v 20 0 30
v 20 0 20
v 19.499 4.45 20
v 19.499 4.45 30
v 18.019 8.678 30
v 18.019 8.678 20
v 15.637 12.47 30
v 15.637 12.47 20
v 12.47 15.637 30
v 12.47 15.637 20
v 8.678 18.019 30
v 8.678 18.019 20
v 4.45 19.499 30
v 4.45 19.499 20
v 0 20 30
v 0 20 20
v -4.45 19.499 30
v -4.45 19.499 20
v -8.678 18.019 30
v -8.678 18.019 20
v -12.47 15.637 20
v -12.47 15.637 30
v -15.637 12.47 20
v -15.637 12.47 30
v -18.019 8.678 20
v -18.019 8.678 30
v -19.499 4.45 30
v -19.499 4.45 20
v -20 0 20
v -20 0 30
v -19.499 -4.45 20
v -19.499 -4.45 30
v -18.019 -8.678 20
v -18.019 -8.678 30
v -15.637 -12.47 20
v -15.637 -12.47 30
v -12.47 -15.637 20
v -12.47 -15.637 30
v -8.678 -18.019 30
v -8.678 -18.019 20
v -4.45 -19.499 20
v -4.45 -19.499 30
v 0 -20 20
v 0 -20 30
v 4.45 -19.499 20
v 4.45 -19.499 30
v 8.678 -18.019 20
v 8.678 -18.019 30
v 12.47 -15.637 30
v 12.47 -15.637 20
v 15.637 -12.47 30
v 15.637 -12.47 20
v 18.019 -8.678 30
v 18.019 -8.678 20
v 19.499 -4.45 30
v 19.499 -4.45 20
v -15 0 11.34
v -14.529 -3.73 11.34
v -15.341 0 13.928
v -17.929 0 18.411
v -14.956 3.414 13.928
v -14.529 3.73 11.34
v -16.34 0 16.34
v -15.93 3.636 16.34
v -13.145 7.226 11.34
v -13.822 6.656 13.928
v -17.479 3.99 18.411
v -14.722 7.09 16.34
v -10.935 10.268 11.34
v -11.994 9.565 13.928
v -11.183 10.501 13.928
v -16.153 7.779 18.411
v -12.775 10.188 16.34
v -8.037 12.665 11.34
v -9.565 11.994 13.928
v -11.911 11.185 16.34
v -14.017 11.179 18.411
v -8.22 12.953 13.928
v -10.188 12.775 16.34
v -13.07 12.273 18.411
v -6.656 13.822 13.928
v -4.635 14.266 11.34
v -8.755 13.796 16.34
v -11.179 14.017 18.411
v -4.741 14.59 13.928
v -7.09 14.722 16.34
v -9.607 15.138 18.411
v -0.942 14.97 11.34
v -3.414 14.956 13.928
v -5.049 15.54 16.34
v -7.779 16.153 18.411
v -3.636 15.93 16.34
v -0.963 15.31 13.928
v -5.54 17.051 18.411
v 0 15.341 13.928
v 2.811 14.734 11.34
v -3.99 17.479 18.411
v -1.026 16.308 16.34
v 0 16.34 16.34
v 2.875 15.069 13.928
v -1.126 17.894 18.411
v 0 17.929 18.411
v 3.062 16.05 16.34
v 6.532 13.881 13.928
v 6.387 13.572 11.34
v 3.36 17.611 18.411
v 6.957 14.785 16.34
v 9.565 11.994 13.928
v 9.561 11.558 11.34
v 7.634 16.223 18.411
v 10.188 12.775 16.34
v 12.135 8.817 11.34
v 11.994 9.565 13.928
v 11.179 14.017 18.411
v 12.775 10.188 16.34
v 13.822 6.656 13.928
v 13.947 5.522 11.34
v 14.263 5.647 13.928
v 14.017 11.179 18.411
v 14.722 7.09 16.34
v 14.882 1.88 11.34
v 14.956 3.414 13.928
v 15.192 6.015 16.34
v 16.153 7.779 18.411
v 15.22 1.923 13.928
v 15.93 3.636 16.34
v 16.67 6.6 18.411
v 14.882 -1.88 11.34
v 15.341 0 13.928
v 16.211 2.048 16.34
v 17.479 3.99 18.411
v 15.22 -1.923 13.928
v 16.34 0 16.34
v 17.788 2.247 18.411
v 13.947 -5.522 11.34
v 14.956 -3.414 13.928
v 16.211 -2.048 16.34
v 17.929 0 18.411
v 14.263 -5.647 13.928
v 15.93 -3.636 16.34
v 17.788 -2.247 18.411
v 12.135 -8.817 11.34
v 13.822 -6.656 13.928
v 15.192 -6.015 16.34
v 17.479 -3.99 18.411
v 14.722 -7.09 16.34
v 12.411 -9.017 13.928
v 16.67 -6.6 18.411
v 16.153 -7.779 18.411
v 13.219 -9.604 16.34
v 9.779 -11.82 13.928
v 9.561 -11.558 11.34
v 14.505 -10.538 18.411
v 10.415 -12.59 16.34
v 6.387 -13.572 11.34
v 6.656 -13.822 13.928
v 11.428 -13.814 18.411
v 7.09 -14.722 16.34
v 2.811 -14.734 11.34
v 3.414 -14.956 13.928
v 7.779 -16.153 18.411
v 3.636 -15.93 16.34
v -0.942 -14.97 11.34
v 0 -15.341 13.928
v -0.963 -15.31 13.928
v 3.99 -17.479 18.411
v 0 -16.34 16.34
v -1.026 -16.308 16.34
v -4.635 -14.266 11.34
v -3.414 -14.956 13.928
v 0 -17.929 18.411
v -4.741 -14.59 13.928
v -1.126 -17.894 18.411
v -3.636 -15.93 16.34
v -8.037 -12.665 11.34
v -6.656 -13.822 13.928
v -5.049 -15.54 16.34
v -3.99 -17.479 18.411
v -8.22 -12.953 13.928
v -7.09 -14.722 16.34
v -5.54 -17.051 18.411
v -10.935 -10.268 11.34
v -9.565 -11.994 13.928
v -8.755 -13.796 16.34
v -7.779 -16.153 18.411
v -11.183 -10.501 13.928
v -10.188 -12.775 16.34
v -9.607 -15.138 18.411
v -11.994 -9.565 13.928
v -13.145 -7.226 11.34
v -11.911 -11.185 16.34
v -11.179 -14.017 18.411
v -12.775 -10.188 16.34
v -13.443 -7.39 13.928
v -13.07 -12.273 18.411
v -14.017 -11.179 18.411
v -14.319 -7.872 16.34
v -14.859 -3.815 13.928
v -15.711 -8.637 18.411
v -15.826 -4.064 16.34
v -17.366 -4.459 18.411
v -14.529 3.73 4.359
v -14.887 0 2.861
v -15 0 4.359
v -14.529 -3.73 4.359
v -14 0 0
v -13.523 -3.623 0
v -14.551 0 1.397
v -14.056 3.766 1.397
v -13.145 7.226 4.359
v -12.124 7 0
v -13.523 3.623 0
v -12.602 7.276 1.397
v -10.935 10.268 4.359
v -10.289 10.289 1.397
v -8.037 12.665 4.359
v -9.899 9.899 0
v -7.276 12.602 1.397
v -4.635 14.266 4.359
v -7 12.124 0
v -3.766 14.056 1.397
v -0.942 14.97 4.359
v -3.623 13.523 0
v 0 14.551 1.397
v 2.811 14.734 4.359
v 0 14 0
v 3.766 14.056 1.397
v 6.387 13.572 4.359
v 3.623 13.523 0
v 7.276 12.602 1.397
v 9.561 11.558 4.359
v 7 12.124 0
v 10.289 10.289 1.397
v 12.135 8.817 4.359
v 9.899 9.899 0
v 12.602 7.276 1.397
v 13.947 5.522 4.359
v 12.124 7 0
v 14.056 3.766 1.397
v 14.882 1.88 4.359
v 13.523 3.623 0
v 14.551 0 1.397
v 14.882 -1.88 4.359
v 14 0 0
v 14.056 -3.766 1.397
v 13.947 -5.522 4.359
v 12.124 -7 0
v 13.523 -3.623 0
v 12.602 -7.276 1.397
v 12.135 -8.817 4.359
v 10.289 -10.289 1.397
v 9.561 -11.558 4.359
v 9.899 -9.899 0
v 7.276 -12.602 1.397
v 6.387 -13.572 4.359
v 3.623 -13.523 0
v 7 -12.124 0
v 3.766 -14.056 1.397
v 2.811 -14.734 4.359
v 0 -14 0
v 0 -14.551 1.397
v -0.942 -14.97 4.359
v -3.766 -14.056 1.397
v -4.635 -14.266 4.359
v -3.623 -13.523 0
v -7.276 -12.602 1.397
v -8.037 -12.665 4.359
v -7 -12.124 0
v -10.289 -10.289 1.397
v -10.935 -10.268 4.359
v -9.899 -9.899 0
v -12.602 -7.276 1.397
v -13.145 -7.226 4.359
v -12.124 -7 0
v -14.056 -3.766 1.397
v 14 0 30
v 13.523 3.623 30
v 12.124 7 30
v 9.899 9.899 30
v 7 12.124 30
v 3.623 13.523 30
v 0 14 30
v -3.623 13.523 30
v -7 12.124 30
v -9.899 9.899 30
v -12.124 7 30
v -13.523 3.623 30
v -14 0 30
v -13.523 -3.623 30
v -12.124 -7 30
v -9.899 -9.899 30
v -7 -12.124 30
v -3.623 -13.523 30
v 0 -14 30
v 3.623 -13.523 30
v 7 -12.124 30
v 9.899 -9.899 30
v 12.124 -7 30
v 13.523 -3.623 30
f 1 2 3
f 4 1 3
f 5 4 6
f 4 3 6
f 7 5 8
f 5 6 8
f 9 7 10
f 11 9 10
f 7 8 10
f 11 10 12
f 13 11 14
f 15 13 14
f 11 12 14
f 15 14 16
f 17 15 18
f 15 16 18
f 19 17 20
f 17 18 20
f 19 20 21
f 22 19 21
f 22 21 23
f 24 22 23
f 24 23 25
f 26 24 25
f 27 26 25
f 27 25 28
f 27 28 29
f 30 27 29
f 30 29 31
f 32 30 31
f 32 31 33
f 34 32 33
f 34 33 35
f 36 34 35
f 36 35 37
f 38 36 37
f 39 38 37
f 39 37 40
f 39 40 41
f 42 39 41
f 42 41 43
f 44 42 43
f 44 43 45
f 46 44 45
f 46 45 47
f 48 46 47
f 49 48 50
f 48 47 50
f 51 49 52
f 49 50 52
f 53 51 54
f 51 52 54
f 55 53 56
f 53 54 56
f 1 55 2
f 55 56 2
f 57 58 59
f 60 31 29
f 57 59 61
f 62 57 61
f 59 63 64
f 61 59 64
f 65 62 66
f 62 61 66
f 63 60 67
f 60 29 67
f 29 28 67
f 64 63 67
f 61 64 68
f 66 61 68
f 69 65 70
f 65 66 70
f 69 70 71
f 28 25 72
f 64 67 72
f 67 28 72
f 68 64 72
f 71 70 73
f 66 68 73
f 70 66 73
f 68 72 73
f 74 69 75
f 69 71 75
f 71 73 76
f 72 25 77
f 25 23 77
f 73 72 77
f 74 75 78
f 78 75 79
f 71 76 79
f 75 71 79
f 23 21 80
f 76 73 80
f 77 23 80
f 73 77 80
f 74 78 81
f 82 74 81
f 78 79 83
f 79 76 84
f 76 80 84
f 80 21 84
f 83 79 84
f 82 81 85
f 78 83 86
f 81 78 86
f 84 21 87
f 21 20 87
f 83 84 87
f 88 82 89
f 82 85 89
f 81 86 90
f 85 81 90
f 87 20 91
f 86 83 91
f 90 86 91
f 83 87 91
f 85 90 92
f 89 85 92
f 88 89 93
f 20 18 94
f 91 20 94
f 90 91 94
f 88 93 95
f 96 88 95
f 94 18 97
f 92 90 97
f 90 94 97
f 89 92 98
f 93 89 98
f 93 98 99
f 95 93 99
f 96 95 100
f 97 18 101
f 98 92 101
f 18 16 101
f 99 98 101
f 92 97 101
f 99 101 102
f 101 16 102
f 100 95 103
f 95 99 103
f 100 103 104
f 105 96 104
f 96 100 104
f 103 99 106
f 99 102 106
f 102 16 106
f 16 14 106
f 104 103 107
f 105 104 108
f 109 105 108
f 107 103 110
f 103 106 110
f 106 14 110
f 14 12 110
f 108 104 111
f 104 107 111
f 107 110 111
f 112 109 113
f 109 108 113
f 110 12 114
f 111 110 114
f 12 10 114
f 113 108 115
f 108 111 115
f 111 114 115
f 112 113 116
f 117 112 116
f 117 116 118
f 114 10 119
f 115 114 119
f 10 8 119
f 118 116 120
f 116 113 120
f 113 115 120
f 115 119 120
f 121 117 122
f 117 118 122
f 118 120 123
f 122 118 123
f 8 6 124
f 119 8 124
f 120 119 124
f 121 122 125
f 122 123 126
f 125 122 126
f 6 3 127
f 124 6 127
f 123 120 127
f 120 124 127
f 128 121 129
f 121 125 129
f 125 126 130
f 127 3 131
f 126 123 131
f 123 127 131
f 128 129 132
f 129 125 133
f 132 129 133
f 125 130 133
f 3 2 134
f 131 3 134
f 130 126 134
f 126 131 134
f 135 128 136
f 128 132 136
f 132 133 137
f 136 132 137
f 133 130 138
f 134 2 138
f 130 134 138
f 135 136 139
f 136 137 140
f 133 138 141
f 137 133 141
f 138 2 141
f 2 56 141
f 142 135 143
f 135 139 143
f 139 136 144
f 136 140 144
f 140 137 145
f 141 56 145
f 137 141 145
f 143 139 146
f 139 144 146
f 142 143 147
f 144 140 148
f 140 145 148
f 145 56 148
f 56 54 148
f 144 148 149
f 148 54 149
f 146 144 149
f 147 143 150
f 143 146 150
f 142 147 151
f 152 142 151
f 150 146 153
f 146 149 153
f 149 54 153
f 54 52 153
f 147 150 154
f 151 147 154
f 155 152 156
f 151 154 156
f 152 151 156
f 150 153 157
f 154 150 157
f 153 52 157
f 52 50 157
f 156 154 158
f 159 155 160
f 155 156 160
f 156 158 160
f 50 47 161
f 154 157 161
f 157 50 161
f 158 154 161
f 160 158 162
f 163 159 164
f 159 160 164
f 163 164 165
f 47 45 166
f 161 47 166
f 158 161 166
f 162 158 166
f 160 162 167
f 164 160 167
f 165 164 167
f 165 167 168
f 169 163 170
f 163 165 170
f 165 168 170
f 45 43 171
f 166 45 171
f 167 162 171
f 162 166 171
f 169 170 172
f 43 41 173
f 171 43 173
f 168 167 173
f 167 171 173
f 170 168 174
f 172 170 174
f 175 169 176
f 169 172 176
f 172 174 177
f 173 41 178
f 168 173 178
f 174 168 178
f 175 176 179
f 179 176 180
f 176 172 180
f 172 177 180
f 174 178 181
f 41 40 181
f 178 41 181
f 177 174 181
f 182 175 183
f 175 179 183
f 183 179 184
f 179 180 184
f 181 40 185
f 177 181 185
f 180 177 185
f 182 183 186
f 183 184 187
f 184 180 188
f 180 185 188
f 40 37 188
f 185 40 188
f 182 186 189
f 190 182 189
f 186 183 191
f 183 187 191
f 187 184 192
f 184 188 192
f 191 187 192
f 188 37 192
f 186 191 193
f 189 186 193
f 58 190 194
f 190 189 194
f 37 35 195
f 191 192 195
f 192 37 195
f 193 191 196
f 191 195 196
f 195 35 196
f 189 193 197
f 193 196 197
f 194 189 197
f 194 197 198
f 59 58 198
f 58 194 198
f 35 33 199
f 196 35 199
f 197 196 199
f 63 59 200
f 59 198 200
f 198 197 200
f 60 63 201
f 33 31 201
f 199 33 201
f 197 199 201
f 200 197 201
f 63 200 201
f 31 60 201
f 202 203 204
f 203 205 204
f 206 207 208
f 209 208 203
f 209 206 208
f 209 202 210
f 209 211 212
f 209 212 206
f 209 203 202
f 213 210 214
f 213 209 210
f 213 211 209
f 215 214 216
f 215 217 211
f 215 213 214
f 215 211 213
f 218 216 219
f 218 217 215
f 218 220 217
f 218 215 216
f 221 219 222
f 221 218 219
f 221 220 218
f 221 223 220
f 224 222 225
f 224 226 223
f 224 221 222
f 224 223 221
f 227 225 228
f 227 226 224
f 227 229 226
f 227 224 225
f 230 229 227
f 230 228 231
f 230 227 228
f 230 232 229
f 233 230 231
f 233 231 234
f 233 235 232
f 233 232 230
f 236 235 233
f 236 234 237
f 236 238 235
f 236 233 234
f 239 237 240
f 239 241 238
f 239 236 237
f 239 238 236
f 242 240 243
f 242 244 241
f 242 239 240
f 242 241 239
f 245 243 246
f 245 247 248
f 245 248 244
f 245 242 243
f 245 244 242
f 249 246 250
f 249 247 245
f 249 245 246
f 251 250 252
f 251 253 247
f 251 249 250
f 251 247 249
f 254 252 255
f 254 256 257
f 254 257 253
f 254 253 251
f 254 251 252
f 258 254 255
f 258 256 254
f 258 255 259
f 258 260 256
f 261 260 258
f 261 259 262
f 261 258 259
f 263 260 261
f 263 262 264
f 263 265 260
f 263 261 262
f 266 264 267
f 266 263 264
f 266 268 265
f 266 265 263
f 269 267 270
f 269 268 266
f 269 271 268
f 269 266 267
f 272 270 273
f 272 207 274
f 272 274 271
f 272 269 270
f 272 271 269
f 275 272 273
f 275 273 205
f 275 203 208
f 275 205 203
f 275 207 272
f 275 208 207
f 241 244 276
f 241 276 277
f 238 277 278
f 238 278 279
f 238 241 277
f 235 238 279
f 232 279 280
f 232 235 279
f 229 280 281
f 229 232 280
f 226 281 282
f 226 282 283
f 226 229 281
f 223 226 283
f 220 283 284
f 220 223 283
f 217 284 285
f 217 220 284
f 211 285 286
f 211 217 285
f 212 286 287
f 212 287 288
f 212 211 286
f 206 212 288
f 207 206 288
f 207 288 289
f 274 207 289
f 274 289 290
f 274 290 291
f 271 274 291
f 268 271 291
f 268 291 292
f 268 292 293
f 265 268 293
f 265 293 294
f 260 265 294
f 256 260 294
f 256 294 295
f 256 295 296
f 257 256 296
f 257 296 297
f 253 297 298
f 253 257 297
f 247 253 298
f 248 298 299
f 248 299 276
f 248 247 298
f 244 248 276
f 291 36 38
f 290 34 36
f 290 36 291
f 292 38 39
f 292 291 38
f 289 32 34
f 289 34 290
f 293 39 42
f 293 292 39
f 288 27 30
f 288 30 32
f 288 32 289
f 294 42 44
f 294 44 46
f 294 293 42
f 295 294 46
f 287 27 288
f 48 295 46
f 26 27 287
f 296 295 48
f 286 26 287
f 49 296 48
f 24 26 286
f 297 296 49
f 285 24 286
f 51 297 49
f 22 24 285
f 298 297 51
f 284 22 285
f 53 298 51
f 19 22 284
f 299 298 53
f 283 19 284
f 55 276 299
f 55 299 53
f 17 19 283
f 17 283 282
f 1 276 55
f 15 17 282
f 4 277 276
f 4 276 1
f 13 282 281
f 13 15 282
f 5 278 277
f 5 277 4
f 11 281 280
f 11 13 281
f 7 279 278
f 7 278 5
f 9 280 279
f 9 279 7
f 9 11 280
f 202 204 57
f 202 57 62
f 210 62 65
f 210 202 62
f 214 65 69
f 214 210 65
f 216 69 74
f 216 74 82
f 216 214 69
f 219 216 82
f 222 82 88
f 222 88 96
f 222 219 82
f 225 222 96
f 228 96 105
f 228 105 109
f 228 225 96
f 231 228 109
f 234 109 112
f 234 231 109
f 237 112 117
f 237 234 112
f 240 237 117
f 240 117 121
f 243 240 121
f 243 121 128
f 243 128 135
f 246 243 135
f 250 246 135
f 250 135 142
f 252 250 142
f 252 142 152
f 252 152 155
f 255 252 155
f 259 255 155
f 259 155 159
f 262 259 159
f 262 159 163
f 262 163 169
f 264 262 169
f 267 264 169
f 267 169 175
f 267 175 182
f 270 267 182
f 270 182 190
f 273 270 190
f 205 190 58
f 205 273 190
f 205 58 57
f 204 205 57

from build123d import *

# Parameters (mm, degrees)
SKETCH1_R           = 20
SKETCH1_R_2         = 14
BOSS_EXTRUDE1_DEPTH = 30
SKETCH2_R           = 20
SKETCH2_R_2         = 15
CUT_EXTRUDE1_DEPTH  = 20
FILLET1_R           = 10


with BuildPart() as part:
    # Sketch1 → Boss-Extrude1 (new body)
    with BuildSketch(Plane.XY):
        Circle(SKETCH1_R)
        Circle(SKETCH1_R_2, mode=Mode.SUBTRACT)
    extrude(amount=BOSS_EXTRUDE1_DEPTH)

    # Sketch2 → Cut-Extrude1 (cut)
    with BuildSketch(Plane(origin=(0, 0, 0), x_dir=(-1, 0, 0), z_dir=(0, 0, -1))):
        Circle(SKETCH2_R)
        Circle(SKETCH2_R_2, mode=Mode.SUBTRACT)
    extrude(amount=-CUT_EXTRUDE1_DEPTH, mode=Mode.SUBTRACT)

    # Fillet1
    # the kernel refuses this fillet: 10 mm, written as the material it adds along each edge
    with BuildSketch(Plane(origin=(0, 0, 20), x_dir=(-1, 0, 0), z_dir=(0, -1, 0))) as fillet1_piece_1:
        with BuildLine():
            CenterArc((25, 8.660254038), FILLET1_R, 180, 60)
            Line((20, 0), (19.9, -0.173205081))
            ThreePointArc((19.9, -0.173205081), (17.5, -0.2), (15, -0.2))
            Line((15, -0.2), (14.8, 0))
            Line((14.8, 0), (14.8, 8.660254038))
            Line((14.8, 8.660254038), (15, 8.660254038))
        make_face()
    revolve(axis=Axis((0, 0, 20), (0, 0, -1)))
    # the kernel refuses this fillet: 10 mm, written as the material it takes off along each edge
    with BuildSketch(Plane(origin=(0, 0, 0), x_dir=(-1, 0, 0), z_dir=(0, -1, 0))) as fillet1_2_piece_1:
        with BuildLine():
            CenterArc((5, -4.358898944), FILLET1_R, 0, 25.841932763)
            Line((14, 0), (14.18, 0.087177979))
            ThreePointArc((14.18, 0.087177979), (14.5, 0.2), (15, 0.2))
            Line((15, 0.2), (15.2, 0))
            Line((15.2, 0), (15.2, -4.358898944))
            Line((15.2, -4.358898944), (15, -4.358898944))
        make_face()
    revolve(axis=Axis((0, 0, 0), (0, 0, -1)), mode=Mode.SUBTRACT)


solid = part.part
